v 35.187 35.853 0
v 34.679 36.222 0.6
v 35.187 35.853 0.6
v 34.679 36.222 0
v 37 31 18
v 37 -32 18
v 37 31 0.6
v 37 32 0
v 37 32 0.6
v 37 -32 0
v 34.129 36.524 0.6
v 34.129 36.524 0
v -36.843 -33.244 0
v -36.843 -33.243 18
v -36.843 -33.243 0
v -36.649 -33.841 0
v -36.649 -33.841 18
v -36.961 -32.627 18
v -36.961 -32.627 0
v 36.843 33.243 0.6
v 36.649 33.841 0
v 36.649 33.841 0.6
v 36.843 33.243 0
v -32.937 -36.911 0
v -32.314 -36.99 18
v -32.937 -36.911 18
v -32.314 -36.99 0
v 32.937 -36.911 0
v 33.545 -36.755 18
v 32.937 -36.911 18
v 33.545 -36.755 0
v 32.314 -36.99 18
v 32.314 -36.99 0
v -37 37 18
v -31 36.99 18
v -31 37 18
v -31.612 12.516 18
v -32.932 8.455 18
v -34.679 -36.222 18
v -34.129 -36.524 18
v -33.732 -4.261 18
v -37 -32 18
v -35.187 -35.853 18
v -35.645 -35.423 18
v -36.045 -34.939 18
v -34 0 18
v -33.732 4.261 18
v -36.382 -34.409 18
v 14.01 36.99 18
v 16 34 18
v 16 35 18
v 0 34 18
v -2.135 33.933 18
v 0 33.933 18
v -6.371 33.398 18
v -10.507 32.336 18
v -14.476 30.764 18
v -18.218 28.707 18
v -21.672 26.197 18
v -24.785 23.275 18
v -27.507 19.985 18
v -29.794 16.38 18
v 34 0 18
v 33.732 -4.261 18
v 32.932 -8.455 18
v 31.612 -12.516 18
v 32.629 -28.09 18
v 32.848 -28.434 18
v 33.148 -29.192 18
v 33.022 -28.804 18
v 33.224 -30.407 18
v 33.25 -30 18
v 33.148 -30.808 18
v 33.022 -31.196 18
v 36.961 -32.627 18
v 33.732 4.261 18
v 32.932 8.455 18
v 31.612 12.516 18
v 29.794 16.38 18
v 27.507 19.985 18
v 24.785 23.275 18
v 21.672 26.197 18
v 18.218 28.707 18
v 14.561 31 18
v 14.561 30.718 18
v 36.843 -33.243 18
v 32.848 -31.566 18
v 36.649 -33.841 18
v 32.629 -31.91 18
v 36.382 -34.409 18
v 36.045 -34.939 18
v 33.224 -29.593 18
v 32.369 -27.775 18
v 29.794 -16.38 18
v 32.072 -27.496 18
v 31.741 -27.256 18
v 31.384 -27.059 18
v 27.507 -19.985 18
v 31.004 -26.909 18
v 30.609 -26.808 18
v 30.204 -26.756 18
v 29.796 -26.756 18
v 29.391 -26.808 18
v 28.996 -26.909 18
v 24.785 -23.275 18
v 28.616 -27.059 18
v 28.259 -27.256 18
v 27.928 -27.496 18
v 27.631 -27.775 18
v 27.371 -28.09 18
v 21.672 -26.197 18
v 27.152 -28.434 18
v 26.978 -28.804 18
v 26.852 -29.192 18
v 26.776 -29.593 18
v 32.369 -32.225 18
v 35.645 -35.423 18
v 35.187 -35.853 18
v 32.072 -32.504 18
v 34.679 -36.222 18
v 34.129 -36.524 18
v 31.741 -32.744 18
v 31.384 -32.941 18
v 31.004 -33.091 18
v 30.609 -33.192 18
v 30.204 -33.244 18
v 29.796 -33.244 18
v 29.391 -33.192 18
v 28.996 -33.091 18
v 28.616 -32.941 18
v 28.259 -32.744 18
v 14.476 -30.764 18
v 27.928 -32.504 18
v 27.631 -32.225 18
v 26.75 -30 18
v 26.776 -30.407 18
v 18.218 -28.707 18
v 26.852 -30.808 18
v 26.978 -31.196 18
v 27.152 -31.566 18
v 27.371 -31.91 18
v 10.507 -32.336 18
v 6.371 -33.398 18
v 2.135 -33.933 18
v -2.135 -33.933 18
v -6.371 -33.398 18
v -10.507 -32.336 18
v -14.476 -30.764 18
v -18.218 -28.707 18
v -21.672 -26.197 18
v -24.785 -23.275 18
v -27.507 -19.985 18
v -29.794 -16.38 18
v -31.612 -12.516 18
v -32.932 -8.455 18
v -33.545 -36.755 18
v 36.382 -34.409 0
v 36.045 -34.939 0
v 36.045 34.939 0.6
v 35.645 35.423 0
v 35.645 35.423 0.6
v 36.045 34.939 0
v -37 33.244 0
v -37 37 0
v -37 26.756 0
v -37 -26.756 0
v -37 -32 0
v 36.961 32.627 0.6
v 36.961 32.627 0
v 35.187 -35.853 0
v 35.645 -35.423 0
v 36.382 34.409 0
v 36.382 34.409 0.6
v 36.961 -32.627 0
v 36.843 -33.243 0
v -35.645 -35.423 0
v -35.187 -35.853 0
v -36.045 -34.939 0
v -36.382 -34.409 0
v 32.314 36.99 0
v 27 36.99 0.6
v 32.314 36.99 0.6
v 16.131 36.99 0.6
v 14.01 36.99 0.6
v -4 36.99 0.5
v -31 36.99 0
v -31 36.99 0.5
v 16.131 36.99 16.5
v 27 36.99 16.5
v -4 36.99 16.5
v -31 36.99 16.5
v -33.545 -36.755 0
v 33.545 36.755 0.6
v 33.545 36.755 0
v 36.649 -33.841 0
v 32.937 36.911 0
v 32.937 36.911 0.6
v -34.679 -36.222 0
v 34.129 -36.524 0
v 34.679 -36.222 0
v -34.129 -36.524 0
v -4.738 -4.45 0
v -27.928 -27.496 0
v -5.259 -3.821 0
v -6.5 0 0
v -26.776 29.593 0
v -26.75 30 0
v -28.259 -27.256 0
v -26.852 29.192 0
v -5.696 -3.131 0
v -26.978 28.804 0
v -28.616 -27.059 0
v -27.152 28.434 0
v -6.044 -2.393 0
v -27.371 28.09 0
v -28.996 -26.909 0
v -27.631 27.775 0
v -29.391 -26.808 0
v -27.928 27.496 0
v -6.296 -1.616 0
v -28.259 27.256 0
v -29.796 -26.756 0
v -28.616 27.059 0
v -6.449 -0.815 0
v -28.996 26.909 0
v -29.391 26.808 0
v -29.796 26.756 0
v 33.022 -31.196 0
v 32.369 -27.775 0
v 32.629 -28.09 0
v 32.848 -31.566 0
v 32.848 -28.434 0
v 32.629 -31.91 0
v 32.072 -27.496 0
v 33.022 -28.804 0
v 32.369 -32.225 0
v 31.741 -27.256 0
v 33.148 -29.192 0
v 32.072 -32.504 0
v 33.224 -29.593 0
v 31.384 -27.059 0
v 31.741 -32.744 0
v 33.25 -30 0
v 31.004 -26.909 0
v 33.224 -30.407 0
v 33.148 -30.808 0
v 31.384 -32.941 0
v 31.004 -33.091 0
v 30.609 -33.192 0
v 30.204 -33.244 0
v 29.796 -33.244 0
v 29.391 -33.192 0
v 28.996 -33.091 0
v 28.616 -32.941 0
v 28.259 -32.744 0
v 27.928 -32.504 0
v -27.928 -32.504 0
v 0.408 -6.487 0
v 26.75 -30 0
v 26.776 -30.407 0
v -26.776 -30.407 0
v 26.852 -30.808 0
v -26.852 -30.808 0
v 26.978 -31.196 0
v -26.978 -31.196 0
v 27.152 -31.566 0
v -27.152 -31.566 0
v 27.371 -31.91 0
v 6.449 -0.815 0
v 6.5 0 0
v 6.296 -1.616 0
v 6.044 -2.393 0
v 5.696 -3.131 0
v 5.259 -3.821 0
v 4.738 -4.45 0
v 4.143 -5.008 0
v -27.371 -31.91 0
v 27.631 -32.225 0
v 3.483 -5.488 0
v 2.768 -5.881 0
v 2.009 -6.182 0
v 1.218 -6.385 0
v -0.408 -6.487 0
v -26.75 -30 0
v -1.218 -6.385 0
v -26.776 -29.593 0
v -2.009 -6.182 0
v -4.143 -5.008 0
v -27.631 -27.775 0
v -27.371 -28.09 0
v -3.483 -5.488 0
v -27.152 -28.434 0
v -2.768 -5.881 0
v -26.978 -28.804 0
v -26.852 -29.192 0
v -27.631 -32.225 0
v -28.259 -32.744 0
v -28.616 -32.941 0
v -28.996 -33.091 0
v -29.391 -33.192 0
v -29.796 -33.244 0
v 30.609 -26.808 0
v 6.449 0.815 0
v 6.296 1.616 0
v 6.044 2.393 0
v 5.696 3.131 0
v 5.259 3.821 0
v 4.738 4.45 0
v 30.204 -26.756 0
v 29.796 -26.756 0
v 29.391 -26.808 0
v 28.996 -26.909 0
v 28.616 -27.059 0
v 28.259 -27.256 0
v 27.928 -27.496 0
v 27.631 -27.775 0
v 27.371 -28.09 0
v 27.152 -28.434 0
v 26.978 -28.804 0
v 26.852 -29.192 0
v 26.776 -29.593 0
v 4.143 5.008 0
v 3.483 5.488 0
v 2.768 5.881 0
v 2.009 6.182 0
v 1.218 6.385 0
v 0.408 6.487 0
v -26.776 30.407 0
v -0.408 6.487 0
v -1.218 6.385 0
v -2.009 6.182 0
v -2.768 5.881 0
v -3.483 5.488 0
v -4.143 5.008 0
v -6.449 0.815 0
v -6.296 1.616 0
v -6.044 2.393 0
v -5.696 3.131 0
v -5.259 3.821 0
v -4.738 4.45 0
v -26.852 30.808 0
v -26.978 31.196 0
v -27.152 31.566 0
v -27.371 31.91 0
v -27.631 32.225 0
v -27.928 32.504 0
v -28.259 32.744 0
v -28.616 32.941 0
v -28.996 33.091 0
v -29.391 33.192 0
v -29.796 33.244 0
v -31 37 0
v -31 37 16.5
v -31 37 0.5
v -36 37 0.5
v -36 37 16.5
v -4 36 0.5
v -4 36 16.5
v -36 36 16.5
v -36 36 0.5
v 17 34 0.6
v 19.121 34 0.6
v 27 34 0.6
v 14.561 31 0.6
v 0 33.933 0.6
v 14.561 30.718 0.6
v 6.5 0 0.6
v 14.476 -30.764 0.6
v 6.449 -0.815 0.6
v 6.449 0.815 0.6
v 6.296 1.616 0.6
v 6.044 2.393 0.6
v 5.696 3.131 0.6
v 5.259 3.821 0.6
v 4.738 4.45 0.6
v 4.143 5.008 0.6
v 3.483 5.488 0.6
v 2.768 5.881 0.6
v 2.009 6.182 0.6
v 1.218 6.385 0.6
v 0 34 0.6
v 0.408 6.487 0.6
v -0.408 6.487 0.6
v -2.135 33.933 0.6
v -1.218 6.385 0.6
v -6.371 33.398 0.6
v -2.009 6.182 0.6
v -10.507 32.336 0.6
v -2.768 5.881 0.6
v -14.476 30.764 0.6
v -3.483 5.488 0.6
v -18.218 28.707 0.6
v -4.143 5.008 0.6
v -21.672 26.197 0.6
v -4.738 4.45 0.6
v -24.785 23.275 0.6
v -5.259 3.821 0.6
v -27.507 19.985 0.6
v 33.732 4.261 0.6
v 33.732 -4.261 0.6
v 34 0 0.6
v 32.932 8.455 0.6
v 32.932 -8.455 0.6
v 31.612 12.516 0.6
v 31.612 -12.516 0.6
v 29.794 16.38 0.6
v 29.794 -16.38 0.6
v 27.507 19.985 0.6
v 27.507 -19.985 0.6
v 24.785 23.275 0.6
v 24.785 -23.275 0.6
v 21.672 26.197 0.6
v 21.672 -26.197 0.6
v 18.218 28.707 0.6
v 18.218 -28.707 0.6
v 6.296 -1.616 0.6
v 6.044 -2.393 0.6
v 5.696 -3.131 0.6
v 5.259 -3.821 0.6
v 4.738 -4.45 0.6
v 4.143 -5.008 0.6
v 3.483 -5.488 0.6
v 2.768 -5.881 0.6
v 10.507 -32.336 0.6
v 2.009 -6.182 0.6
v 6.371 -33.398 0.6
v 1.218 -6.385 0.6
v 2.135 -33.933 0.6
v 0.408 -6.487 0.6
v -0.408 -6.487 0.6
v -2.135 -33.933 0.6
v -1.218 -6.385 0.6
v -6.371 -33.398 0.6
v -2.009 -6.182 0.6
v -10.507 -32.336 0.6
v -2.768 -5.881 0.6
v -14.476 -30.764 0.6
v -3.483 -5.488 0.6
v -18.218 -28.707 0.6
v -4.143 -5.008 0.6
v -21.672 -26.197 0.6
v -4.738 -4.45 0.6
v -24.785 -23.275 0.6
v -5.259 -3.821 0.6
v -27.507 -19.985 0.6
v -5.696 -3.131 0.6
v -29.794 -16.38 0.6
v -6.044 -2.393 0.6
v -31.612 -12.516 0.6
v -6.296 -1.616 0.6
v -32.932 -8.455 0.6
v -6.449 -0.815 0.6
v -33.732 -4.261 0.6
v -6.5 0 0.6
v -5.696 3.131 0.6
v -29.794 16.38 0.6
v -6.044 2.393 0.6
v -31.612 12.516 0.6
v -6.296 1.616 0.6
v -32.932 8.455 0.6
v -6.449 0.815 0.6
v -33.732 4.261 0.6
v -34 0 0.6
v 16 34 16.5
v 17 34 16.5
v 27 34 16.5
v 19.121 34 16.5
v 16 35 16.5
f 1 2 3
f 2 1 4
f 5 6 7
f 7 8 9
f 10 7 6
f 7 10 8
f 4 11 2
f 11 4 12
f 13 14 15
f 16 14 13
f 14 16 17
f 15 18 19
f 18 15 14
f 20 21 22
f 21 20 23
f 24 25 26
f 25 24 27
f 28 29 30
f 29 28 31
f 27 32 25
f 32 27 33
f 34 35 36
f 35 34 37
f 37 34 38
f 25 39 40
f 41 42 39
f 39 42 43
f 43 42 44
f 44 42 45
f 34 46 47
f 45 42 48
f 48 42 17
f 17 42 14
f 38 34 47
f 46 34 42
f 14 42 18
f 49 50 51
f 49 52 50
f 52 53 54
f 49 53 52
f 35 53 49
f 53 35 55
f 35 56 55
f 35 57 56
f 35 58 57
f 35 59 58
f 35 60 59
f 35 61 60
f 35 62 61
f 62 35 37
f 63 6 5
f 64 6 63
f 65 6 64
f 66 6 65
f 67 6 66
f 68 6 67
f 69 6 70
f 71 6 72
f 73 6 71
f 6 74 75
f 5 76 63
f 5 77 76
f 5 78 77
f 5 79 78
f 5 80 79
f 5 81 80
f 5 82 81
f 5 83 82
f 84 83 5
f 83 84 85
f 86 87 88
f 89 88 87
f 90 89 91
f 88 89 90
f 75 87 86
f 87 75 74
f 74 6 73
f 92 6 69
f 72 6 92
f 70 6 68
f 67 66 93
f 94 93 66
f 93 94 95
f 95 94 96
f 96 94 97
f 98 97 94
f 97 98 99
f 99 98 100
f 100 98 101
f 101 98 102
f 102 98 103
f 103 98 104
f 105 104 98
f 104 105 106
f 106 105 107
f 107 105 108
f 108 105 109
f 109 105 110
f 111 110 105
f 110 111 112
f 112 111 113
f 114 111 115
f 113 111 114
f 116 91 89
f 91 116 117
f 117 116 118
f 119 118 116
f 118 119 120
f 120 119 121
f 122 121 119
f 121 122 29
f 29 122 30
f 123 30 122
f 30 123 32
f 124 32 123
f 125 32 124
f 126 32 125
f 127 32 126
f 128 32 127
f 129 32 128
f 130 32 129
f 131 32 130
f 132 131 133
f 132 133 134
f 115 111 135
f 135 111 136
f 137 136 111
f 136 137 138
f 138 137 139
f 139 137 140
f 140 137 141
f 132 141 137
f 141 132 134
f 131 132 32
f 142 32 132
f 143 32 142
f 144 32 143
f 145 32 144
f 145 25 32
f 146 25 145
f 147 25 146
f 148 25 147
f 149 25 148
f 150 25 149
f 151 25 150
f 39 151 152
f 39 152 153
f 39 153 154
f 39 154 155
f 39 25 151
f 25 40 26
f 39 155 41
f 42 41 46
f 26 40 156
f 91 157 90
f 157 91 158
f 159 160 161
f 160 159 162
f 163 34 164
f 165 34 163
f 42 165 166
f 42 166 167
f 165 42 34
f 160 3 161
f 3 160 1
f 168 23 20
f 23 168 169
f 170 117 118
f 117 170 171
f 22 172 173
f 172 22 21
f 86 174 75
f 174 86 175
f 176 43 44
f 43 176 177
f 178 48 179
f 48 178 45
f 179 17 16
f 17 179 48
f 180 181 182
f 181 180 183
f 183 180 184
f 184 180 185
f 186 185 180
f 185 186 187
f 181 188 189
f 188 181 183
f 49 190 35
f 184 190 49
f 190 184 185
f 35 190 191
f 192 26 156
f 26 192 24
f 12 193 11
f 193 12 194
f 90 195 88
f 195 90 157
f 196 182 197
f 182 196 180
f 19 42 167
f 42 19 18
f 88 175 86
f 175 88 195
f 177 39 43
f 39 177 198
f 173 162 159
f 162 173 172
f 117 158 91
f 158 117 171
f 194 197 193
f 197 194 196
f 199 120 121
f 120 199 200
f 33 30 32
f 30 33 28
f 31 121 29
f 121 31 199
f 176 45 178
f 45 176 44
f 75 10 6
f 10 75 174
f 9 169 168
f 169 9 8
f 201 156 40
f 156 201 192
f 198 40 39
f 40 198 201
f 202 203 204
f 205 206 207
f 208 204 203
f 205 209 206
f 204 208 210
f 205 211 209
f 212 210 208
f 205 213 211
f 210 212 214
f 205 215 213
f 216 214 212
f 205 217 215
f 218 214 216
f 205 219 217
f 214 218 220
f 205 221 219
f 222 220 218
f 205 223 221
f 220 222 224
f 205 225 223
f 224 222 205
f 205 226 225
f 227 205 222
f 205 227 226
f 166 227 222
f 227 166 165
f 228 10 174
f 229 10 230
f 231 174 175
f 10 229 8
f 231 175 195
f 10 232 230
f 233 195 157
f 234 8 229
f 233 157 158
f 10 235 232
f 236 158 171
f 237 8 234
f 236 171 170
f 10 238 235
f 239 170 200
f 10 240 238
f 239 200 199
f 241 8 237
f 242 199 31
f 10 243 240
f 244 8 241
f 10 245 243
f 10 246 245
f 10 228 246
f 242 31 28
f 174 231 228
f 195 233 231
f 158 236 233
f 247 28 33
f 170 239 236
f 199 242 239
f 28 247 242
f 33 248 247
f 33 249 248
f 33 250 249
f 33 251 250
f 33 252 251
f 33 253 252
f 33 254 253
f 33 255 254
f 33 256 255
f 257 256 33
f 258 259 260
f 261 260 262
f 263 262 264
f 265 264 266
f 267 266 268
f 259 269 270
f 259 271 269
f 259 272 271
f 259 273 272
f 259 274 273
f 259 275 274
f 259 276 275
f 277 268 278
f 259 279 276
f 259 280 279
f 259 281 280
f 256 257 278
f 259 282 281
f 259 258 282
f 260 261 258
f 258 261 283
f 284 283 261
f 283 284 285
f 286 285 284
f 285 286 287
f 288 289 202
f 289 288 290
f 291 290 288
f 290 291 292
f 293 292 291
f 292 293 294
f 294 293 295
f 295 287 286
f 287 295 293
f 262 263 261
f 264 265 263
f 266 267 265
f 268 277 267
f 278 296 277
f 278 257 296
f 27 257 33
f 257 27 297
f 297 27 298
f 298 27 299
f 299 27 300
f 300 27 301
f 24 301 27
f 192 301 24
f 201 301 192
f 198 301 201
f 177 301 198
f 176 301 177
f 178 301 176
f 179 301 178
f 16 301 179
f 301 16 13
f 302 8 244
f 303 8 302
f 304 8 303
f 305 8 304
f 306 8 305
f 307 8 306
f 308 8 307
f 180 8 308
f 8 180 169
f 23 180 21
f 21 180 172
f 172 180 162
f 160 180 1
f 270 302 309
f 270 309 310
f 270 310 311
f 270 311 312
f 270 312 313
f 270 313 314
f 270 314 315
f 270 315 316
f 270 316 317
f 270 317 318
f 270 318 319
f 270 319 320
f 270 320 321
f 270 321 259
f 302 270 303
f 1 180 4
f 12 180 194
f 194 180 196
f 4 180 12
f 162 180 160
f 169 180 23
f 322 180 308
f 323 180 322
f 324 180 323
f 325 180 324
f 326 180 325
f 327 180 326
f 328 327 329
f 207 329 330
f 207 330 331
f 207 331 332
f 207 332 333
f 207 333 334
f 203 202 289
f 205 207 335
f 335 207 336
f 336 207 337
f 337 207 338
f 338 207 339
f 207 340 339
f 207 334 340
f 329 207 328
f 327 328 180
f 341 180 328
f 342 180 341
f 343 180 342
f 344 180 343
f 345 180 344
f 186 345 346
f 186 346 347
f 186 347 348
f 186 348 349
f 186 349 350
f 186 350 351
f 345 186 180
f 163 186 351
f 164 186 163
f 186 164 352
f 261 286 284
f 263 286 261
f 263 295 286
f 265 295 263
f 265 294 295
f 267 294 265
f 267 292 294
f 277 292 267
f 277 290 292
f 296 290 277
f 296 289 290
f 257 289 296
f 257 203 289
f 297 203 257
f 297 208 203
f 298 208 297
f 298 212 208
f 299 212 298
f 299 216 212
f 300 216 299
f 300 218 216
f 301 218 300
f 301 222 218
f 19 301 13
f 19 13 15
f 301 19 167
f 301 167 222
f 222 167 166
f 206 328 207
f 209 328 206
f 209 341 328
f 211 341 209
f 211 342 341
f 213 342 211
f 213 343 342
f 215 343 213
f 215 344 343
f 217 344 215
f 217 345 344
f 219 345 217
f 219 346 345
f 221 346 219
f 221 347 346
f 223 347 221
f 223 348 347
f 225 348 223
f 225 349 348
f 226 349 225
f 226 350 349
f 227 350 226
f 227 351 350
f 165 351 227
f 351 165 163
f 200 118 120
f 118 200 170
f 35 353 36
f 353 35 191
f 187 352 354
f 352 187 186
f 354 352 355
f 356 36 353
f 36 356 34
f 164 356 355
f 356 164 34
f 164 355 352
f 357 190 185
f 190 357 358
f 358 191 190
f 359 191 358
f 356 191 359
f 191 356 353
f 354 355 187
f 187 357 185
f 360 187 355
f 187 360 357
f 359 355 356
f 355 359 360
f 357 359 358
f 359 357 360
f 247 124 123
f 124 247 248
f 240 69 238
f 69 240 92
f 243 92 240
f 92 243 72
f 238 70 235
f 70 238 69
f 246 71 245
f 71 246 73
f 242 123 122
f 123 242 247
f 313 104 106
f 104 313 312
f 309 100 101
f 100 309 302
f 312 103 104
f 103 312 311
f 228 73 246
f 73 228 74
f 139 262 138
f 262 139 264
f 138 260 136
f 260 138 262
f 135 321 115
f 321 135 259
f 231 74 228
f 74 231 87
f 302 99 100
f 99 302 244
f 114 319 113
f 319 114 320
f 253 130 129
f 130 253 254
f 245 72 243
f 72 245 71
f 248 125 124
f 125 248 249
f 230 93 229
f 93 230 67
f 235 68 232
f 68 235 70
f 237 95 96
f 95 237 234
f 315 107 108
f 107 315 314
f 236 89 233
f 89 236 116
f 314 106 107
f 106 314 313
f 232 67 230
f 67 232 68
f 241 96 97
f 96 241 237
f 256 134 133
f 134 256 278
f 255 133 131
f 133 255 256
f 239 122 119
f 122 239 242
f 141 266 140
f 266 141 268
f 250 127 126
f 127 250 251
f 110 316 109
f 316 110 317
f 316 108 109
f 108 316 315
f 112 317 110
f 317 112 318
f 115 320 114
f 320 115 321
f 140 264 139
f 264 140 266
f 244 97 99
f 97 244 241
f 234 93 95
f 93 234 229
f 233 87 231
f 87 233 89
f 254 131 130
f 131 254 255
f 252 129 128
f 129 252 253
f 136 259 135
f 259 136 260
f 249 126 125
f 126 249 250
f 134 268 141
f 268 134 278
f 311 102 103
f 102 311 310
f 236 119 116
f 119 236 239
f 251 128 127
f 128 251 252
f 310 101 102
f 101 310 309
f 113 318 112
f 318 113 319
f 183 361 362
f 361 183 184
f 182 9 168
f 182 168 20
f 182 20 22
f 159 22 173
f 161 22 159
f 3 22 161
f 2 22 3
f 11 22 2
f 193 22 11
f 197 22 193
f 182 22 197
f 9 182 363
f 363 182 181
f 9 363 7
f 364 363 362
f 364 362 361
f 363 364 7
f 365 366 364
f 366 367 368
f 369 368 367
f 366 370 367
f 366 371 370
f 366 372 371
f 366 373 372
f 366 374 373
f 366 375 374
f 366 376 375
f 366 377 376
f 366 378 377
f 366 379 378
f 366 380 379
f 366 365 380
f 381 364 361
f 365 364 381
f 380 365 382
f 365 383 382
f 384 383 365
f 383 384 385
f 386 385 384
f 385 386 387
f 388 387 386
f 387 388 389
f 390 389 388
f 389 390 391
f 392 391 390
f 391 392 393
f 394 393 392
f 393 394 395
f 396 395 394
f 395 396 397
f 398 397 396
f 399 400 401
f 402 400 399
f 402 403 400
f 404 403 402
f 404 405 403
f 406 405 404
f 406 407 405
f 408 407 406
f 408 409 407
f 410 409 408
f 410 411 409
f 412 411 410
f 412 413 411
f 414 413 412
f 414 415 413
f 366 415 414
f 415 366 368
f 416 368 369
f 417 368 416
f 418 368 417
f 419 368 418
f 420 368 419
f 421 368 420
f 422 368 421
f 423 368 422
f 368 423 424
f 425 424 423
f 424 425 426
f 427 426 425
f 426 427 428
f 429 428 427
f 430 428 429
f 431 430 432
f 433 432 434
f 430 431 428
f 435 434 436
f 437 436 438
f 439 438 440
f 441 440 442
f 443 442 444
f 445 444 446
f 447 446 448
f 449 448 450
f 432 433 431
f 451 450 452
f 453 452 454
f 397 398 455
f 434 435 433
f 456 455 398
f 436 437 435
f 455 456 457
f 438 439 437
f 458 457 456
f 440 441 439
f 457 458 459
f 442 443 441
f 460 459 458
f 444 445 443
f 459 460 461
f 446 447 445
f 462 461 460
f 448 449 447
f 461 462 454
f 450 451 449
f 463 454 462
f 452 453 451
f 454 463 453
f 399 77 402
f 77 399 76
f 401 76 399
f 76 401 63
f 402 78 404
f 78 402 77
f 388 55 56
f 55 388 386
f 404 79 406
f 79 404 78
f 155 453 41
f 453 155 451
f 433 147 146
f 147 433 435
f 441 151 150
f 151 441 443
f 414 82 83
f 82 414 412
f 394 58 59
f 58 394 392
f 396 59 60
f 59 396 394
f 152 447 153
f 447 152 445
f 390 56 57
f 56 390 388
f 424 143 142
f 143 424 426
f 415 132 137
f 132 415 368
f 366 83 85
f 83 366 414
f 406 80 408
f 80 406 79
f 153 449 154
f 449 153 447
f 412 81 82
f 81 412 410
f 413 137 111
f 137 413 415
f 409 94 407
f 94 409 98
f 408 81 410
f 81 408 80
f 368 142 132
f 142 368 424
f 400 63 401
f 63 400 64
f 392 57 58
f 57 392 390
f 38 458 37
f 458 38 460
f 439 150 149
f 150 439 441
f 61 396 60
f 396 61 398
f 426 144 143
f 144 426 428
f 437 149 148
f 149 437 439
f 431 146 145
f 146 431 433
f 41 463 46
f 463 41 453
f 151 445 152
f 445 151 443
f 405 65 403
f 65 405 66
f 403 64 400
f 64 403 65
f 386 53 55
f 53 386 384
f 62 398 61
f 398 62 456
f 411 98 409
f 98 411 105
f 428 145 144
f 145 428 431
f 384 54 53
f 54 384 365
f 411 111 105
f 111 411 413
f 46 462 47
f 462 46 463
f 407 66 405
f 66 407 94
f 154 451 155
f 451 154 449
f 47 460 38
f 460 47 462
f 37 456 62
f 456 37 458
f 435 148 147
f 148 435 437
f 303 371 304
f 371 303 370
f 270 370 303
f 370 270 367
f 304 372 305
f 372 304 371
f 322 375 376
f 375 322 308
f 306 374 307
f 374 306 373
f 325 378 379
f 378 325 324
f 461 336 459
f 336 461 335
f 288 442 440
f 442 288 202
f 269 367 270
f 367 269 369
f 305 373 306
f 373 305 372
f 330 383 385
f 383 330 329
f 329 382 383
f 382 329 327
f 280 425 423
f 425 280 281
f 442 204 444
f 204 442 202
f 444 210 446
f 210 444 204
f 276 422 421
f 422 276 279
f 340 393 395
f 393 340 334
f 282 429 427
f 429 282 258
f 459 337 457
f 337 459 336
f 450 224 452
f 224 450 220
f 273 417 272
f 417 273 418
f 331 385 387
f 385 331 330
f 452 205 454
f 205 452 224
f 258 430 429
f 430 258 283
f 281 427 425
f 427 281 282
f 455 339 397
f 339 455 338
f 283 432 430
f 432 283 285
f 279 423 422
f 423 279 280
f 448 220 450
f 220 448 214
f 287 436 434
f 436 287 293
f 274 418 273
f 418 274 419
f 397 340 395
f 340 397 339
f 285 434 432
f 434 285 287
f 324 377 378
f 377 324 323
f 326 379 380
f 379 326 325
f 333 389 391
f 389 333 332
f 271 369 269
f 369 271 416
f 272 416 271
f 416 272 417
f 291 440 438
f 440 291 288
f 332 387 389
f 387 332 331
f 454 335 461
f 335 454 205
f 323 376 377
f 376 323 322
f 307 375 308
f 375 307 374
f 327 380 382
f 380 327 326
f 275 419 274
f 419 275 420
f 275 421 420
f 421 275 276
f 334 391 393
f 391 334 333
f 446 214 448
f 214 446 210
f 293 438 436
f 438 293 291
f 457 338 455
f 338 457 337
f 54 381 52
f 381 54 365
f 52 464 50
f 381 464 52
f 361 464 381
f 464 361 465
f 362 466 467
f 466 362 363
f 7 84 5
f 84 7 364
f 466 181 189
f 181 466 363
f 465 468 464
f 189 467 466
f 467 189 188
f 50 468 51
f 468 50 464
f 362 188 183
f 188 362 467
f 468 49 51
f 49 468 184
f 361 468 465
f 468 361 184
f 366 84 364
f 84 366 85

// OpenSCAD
$fn = 50;


difference() {
	union() {
		hull() {
			translate(v = [-32.0000000000, 32.0000000000, 0]) {
				cylinder(h = 18, r = 5);
			}
			translate(v = [32.0000000000, 32.0000000000, 0]) {
				cylinder(h = 18, r = 5);
			}
			translate(v = [-32.0000000000, -32.0000000000, 0]) {
				cylinder(h = 18, r = 5);
			}
			translate(v = [32.0000000000, -32.0000000000, 0]) {
				cylinder(h = 18, r = 5);
			}
		}
		translate(v = [-37.0000000000, 31.0000000000, 0]) {
			cube(size = [6, 6, 18]);
		}
	}
	union() {
		translate(v = [-37.5000000000, -30.0000000000, -250.0000000000]) {
			rotate(a = [0, 0, 0]) {
				difference() {
					union() {
						hull() {
							translate(v = [7.5000000000, 0, 0]) {
								cylinder(h = 250, r = 3.2500000000, r1 = 3.2500000000, r2 = 3.2500000000);
							}
							translate(v = [-7.5000000000, 0, 0]) {
								cylinder(h = 250, r = 3.2500000000, r1 = 3.2500000000, r2 = 3.2500000000);
							}
						}
					}
					union();
				}
			}
		}
		translate(v = [-37.5000000000, 30.0000000000, -250.0000000000]) {
			rotate(a = [0, 0, 0]) {
				difference() {
					union() {
						hull() {
							translate(v = [7.5000000000, 0, 0]) {
								cylinder(h = 250, r = 3.2500000000, r1 = 3.2500000000, r2 = 3.2500000000);
							}
							translate(v = [-7.5000000000, 0, 0]) {
								cylinder(h = 250, r = 3.2500000000, r1 = 3.2500000000, r2 = 3.2500000000);
							}
						}
					}
					union();
				}
			}
		}
		translate(v = [-36.0000000000, 36.0000000000, 0.5000000000]) {
			cube(size = [32, 1, 16]);
		}
		translate(v = [30.0000000000, -30.0000000000, -50.0000000000]) {
			cylinder(h = 100, r = 3.2500000000);
		}
		translate(v = [0, 0, 0.6000000000]) {
			cylinder(h = 20.4000000000, r = 34.0000000000);
		}
		translate(v = [0, 0, -9.0000000000]) {
			cylinder(h = 18, r = 6.5000000000);
		}
		translate(v = [0.0000000000, 31.0000000000, 0.6000000000]) {
			cube(size = [37.0000000000, 3, 20.4000000000]);
		}
		translate(v = [27.0000000000, 31.0000000000, 0.6000000000]) {
			cube(size = [10, 6, 20.4000000000]);
		}
		translate(v = [16.0000000000, 31.0000000000, 16.5000000000]) {
			cube(size = [21, 6, 1.5000000000]);
		}
		translate(v = [13.2500000000, 37.7500000000, 0.6000000000]) {
			rotate(a = [0, 0, -45]) {
				cube(size = [7.5000000000, 1.5000000000, 20.4000000000]);
			}
		}
		translate(v = [7.0610000000, 29.0000000000, 0.6000000000]) {
			cube(size = [7.5000000000, 2, 17.4000000000]);
		}
	}
}
